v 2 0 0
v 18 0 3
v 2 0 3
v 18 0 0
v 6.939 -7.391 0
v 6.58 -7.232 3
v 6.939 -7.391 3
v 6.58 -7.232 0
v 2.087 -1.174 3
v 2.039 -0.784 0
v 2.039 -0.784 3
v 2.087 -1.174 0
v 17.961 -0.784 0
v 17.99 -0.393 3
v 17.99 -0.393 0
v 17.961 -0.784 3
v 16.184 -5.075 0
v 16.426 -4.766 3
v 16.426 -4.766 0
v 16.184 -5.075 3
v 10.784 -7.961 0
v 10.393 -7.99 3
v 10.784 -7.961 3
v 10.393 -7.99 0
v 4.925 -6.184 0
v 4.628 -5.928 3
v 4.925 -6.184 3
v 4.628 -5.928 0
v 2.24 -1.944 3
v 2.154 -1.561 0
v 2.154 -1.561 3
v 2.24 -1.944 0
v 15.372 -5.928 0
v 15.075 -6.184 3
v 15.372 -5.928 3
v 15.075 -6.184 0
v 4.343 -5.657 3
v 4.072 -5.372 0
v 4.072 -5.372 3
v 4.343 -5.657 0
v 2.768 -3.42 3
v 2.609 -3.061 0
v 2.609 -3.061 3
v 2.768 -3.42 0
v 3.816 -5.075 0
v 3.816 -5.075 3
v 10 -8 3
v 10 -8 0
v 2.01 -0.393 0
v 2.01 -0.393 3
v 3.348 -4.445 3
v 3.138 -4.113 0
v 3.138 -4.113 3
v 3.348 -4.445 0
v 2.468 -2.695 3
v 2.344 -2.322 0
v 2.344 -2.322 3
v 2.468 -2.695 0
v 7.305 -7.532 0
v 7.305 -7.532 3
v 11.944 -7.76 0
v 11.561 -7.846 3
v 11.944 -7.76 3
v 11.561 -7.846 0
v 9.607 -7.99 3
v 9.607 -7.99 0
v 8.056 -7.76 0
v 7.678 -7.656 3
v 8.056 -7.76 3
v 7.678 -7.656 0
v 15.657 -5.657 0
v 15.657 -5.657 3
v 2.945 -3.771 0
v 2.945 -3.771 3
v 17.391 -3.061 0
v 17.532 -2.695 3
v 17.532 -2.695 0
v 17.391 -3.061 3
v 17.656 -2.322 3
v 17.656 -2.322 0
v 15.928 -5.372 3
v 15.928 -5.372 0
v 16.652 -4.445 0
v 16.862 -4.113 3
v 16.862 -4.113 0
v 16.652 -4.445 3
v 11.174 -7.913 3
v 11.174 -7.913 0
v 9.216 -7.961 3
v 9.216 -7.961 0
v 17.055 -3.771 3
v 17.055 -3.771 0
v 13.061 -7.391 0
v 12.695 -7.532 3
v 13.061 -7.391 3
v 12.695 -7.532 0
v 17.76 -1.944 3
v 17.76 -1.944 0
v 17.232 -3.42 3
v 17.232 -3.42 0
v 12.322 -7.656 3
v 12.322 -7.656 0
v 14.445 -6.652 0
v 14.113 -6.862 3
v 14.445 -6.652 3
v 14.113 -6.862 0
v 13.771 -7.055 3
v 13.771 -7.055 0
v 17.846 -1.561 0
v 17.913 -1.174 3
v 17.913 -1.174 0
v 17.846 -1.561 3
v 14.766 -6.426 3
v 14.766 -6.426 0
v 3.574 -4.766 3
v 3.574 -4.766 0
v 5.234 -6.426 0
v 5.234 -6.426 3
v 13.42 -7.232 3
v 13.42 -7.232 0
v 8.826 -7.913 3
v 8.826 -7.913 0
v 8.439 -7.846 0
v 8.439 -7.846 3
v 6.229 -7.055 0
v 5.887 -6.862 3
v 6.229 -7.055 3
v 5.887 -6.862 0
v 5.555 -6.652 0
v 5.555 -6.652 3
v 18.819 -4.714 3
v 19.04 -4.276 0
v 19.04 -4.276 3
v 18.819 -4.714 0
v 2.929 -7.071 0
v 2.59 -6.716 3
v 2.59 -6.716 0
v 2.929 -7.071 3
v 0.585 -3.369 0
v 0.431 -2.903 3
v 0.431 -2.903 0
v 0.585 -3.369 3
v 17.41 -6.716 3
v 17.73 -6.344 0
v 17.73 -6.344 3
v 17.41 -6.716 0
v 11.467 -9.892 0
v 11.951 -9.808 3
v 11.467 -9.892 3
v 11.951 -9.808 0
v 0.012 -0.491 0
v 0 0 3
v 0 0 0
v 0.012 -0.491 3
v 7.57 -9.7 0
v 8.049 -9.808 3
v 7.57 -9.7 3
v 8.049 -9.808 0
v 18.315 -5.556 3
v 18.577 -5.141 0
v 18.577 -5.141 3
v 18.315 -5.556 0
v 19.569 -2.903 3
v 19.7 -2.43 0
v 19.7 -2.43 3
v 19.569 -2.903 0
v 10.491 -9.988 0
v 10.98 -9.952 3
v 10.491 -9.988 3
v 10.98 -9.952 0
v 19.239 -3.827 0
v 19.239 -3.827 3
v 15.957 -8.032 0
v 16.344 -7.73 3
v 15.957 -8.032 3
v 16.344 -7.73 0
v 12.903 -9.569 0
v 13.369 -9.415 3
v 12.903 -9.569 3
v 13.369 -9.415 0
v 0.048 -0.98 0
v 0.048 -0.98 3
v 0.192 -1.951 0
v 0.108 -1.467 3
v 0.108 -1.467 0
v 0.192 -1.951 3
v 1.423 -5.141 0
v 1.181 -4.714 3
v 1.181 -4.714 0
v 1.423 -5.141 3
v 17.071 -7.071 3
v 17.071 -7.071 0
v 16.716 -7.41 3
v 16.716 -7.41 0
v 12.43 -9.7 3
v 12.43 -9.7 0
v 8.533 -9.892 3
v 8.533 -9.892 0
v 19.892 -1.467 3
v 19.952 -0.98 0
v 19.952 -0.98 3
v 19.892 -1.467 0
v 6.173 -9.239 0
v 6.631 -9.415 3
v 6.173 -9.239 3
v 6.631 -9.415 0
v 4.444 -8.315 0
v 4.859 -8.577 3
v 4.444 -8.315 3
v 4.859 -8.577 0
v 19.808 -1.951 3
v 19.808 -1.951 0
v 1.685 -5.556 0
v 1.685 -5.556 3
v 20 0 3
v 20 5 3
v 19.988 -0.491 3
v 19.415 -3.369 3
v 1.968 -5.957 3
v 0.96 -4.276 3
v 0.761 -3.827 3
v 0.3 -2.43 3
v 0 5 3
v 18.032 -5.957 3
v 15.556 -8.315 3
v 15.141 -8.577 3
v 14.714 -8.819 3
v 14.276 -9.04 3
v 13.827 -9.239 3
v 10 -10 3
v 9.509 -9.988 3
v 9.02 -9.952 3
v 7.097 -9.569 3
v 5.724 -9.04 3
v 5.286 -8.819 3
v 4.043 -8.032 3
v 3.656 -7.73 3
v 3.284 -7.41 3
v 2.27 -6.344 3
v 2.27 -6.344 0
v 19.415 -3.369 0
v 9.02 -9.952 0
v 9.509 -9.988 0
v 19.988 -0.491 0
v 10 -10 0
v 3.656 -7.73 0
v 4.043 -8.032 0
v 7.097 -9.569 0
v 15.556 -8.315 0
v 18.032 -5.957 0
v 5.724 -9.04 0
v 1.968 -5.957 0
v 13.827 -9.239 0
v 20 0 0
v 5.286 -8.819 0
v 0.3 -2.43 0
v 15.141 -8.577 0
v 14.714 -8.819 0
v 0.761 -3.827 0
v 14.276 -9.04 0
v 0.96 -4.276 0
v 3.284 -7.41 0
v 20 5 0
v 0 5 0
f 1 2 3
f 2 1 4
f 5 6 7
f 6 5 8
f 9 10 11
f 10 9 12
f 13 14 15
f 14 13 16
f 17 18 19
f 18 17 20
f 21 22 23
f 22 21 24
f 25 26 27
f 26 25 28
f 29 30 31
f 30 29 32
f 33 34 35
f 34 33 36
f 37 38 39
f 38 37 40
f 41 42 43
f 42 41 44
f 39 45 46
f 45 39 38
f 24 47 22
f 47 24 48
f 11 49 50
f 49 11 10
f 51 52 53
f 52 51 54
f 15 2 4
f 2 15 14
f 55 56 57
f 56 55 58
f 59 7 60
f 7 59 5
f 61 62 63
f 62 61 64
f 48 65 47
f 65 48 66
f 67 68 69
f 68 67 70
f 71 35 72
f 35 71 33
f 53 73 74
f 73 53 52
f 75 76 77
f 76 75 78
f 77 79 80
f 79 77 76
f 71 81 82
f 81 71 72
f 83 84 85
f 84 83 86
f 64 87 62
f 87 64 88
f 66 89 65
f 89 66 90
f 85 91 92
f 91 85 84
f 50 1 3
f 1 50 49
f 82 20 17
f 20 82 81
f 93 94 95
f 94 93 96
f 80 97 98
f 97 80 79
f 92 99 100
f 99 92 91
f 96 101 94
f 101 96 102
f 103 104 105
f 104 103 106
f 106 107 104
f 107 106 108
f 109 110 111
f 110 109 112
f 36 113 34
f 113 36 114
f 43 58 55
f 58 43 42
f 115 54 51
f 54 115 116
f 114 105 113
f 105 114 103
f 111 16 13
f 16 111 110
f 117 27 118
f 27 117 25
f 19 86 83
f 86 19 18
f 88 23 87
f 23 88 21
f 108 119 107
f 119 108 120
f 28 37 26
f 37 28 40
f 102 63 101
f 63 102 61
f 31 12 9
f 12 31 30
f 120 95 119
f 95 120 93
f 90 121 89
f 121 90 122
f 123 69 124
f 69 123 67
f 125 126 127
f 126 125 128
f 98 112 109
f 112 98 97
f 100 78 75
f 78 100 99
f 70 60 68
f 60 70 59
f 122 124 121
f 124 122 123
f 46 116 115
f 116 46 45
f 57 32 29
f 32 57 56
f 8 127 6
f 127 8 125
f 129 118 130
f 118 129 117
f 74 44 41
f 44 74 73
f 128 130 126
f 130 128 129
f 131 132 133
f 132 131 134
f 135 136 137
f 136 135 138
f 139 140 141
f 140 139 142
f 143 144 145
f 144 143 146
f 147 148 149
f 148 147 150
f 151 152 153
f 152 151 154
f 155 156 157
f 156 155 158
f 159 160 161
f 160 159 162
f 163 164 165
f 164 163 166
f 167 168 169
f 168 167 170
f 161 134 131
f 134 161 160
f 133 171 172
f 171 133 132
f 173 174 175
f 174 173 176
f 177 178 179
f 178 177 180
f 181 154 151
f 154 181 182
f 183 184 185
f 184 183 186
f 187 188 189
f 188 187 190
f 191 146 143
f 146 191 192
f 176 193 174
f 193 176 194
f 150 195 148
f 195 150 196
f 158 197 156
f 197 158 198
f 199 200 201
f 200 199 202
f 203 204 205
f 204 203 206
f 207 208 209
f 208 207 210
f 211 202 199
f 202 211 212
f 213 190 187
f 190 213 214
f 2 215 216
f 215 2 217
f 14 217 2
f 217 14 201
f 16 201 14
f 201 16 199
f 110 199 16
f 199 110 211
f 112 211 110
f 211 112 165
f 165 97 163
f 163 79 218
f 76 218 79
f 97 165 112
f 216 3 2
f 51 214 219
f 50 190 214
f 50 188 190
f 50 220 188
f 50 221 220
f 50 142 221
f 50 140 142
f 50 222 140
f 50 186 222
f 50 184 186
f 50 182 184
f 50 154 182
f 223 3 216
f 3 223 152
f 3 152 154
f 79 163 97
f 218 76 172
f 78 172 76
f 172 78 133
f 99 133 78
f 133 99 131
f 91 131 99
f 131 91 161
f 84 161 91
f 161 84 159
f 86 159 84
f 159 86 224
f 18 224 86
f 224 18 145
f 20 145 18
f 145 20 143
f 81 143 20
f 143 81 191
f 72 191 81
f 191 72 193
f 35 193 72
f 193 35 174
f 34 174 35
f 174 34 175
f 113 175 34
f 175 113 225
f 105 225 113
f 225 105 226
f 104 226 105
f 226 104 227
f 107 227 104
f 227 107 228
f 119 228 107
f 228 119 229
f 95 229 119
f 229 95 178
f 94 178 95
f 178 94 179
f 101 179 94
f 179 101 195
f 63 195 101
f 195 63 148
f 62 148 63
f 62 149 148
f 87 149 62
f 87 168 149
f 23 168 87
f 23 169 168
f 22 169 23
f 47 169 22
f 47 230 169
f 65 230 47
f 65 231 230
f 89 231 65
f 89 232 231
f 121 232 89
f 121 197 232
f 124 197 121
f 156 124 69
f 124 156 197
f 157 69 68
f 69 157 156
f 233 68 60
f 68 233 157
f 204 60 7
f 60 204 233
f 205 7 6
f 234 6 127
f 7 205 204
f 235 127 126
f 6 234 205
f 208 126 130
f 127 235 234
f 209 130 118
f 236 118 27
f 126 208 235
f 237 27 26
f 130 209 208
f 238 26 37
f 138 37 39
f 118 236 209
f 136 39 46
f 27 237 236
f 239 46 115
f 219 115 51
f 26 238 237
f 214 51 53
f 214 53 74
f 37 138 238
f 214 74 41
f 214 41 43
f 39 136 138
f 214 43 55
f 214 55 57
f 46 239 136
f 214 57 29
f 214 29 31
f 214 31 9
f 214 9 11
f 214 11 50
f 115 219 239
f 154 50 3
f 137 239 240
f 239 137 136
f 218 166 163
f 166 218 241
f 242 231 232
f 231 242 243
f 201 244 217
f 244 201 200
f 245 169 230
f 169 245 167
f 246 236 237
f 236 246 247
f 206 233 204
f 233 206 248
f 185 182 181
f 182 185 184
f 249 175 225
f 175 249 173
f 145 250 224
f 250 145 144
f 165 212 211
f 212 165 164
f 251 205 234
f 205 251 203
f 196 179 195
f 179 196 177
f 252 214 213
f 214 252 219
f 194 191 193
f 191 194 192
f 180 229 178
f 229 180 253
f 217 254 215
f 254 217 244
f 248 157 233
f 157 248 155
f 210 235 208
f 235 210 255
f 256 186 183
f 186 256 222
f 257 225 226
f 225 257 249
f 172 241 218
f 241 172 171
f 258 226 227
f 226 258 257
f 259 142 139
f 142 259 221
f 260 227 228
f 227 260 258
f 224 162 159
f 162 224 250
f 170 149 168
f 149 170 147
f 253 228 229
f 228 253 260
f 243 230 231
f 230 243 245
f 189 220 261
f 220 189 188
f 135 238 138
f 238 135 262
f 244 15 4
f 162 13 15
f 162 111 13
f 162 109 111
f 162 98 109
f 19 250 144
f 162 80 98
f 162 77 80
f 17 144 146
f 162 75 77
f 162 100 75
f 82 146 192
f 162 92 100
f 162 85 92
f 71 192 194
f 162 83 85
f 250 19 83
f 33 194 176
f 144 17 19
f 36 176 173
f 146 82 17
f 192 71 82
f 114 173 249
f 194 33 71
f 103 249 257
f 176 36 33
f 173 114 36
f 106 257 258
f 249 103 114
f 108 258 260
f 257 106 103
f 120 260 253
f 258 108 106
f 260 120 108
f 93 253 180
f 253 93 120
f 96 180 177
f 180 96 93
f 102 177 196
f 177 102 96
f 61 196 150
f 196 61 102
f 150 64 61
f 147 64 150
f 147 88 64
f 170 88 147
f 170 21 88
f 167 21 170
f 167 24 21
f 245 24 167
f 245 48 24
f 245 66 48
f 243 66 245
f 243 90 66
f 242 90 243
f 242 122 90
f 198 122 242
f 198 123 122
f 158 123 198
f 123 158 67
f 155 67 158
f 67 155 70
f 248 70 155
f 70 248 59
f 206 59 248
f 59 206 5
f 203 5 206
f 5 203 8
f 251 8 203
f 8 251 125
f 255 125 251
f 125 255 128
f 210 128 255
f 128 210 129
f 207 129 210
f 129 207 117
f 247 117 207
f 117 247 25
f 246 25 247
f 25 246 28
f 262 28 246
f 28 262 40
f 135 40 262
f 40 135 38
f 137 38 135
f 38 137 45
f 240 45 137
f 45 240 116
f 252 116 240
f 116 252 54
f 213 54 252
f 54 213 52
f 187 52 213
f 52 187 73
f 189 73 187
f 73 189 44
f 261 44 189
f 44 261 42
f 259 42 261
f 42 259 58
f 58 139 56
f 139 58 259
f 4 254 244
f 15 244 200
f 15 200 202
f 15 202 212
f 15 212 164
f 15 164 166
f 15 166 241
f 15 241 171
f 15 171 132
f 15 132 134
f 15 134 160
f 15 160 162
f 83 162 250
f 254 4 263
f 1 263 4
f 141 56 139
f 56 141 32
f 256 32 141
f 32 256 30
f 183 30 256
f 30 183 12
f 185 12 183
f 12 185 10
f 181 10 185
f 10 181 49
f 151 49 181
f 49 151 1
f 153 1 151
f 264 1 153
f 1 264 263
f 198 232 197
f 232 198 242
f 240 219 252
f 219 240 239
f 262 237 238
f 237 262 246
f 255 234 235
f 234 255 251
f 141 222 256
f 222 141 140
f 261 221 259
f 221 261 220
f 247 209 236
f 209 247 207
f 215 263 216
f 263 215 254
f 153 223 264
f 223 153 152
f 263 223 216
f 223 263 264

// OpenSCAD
$fn=128;
cube([20,5,3]);
translate([10,0,0]) {
    difference() {
        cylinder(h=3,r=10);
        translate([0,0,-0.5]) union() {
            translate([-10,0,0]) cube([20,11,4]);
            cylinder(h=4,r=8);
        }
    }
}
